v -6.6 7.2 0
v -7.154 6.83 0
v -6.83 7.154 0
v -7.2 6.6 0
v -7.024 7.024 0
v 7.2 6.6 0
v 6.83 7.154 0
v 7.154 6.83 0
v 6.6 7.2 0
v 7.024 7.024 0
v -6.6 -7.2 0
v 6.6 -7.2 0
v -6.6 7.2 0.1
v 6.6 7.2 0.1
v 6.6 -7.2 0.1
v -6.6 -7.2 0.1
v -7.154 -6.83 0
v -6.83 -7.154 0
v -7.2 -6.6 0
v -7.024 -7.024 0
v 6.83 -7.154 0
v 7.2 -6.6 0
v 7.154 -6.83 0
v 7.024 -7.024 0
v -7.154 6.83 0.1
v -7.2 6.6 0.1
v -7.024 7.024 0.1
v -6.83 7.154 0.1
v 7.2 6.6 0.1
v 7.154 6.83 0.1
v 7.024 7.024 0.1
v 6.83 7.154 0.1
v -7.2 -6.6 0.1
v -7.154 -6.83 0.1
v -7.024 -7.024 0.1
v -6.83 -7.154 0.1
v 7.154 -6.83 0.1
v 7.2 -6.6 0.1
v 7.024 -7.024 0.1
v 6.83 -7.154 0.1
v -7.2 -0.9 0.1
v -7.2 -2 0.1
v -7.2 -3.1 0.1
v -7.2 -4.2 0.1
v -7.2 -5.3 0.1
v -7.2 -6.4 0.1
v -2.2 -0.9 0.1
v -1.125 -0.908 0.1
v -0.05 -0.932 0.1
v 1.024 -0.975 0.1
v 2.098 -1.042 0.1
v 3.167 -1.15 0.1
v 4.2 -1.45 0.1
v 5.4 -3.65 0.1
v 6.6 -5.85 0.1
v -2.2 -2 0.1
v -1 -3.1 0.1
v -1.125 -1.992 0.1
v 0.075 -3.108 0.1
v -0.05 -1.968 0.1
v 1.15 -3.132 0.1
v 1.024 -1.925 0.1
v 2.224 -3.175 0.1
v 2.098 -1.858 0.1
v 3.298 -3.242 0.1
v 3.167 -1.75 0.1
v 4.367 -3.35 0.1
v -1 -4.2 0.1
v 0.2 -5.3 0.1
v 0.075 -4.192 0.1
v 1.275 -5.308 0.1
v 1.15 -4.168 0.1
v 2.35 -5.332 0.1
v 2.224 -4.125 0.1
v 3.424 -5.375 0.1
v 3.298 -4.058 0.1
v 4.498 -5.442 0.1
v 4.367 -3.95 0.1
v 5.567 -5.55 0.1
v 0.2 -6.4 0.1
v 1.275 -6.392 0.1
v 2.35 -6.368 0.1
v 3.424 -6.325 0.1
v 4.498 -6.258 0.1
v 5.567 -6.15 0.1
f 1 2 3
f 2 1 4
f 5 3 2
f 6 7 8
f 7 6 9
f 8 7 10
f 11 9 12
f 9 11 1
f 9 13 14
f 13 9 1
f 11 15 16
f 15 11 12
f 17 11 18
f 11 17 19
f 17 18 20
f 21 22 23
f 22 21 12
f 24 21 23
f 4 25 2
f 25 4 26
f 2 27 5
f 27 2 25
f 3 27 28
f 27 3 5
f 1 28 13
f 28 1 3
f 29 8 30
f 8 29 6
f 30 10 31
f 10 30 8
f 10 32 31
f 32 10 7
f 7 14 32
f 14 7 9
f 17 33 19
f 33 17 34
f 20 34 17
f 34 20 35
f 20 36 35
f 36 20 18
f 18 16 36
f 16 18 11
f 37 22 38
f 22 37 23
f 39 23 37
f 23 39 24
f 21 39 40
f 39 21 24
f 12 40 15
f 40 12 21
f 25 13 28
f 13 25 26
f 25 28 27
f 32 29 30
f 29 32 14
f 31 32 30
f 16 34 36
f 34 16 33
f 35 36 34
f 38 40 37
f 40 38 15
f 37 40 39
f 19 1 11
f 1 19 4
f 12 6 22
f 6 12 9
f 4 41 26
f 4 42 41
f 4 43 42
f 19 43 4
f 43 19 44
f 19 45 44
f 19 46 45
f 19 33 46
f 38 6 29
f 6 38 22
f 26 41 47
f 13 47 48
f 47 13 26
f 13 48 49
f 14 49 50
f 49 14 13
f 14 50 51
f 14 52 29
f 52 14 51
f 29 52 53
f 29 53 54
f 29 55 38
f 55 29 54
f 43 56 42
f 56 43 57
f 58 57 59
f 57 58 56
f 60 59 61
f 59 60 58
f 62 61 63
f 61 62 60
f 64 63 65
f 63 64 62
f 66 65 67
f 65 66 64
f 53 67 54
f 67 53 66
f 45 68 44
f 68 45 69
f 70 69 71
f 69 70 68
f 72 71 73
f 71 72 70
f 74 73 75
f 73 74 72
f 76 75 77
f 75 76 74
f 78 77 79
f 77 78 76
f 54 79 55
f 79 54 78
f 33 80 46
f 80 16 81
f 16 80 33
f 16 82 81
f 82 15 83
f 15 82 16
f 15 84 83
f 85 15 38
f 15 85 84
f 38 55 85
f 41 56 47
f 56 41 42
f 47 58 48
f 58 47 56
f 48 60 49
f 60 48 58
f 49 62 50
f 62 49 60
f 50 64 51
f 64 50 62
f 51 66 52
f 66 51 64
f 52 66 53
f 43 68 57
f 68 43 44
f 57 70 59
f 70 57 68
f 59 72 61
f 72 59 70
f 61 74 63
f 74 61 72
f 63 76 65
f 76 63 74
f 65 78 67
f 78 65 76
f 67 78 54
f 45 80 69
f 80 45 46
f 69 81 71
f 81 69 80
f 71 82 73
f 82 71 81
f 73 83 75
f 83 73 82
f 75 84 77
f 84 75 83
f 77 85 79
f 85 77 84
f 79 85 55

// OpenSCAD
// file: ../p/box3u12.scad
use <../lib.scad>
function ldraw_lib__box3u12() = [
// 0 Box with 3 Parallel Faces without Any Edges
// 0 Name: box3u12.dat
// 0 Author: J.C. Tchang [tchang]
// 0 !LDRAW_ORG Primitive UPDATE 2014-02
// 0 !LICENSE Licensed under CC BY 4.0 : see CAreadme.txt
// 
// 0 BFC CERTIFY CCW
  [0,"BFC","CERTIFY"],
  [0,"BFC","CCW"],
// 
// 0 !HISTORY 2014-12-23 [PTadmin] Official Update 2014-02
// 
// 
// 4 16 -1 1 1 1 1 1 1 1 -1 -1 1 -1
  [4,16,-1,1,1,1,1,1,1,1,-1,-1,1,-1],
// 4 16 -1 1 1 -1 0 1 1 0 1 1 1 1
  [4,16,-1,1,1,-1,0,1,1,0,1,1,1,1],
// 4 16 1 1 -1 1 0 -1 -1 0 -1 -1 1 -1
  [4,16,1,1,-1,1,0,-1,-1,0,-1,-1,1,-1],
];
module ldraw_lib__box3u12(step=0, col=false, unit=2/5, alt=false, line=0.2, solid=!$preview)
    makepoly(ldraw_lib__box3u12(), step=step, col=col, unit=unit, alt=alt, line=line, solid=solid);
ldraw_lib__box3u12(line=0.2);
// file: ../p/1-4cyli.scad
use <../lib.scad>
function ldraw_lib__1_4cyli() = [
// 0 Cylinder 0.25
// 0 Name: 1-4cyli.dat
// 0 Author: James Jessiman
// 0 !LDRAW_ORG Primitive UPDATE 2012-01
// 0 !LICENSE Licensed under CC BY 4.0 : see CAreadme.txt
// 
// 0 BFC CERTIFY CCW
  [0,"BFC","CERTIFY"],
  [0,"BFC","CCW"],
// 
// 0 !HISTORY 2002-03-23 [sbliss] Added BFC statement.
// 0 !HISTORY 2002-04-25 [PTadmin] Official Update 2002-02
// 0 !HISTORY 2007-06-22 [PTadmin] Header formatted for Contributor Agreement
// 0 !HISTORY 2008-07-01 [PTadmin] Official Update 2008-01
// 0 !HISTORY 2012-02-16 [Philo] Changed to CCW
// 0 !HISTORY 2012-03-30 [PTadmin] Official Update 2012-01
// 
// 
// 4 16 1 1 0 0.9239 1 0.3827 0.9239 0 0.3827 1 0 0
  [4,16,1,1,0,0.9239,1,0.3827,0.9239,0,0.3827,1,0,0],
// 5 24 1 0 0 1 1 0 0.9239 0 0.3827 1 0 -1
  [5,24,1,0,0,1,1,0,0.9239,0,0.3827,1,0,-1],
// 4 16 0.9239 1 0.3827 0.7071 1 0.7071 0.7071 0 0.7071 0.9239 0 0.3827
  [4,16,0.9239,1,0.3827,0.7071,1,0.7071,0.7071,0,0.7071,0.9239,0,0.3827],
// 5 24 0.9239 0 0.3827 0.9239 1 0.3827 0.7071 0 0.7071 1 0 0
  [5,24,0.9239,0,0.3827,0.9239,1,0.3827,0.7071,0,0.7071,1,0,0],
// 4 16 0.7071 1 0.7071 0.3827 1 0.9239 0.3827 0 0.9239 0.7071 0 0.7071
  [4,16,0.7071,1,0.7071,0.3827,1,0.9239,0.3827,0,0.9239,0.7071,0,0.7071],
// 5 24 0.7071 0 0.7071 0.7071 1 0.7071 0.3827 0 0.9239 0.9239 0 0.3827
  [5,24,0.7071,0,0.7071,0.7071,1,0.7071,0.3827,0,0.9239,0.9239,0,0.3827],
// 4 16 0.3827 1 0.9239 0 1 1 0 0 1 0.3827 0 0.9239
  [4,16,0.3827,1,0.9239,0,1,1,0,0,1,0.3827,0,0.9239],
// 5 24 0.3827 0 0.9239 0.3827 1 0.9239 0 0 1 0.7071 0 0.7071
  [5,24,0.3827,0,0.9239,0.3827,1,0.9239,0,0,1,0.7071,0,0.7071],
// 5 24 0 0 1 0 1 1 0.3827 0 0.9239 -1 0 1
  [5,24,0,0,1,0,1,1,0.3827,0,0.9239,-1,0,1],
];
module ldraw_lib__1_4cyli(step=0, col=false, unit=2/5, alt=false, line=0.2, solid=!$preview)
    makepoly(ldraw_lib__1_4cyli(), step=step, col=col, unit=unit, alt=alt, line=line, solid=solid);
ldraw_lib__1_4cyli(line=0.2);
// file: ../p/1-4chrd.scad
use <../lib.scad>
function ldraw_lib__1_4chrd() = [
// 0 Chord 0.25
// 0 Name: 1-4chrd.dat
// 0 Author: Max Martin Richter [MMR1988]
// 0 !LDRAW_ORG Primitive UPDATE 2023-05
// 0 !LICENSE Licensed under CC BY 4.0 : see CAreadme.txt
// 
// 0 BFC CERTIFY CCW
  [0,"BFC","CERTIFY"],
  [0,"BFC","CCW"],
// 
// 0 !HISTORY 2004-04-22 [PTadmin] Official Update 2004-02
// 0 !HISTORY 2007-10-09 [PTadmin] Header formatted for Contributor Agreement
// 0 !HISTORY 2008-07-01 [PTadmin] Official Update 2008-01
// 0 !HISTORY 2012-08-02 [MMR1988] Re-creation with PrimGen2 and Rectifier
// 0 !HISTORY 2012-08-09 [PTadmin] Official Update 2012-02
// 0 !HISTORY 2023-10-27 [OrionP] Change author to MMR1988 from hafhead
// 0 !HISTORY 2023-10-31 [OrionP] Official Update 2023-05
// 
// 4 16 0.9239 0 0.3827 0.3827 0 0.9239 0 0 1 1 0 0
  [4,16,0.9239,0,0.3827,0.3827,0,0.9239,0,0,1,1,0,0],
// 3 16 0.7071 0 0.7071 0.3827 0 0.9239 0.9239 0 0.3827
  [3,16,0.7071,0,0.7071,0.3827,0,0.9239,0.9239,0,0.3827],
];
module ldraw_lib__1_4chrd(step=0, col=false, unit=2/5, alt=false, line=0.2, solid=!$preview)
    makepoly(ldraw_lib__1_4chrd(), step=step, col=col, unit=unit, alt=alt, line=line, solid=solid);
ldraw_lib__1_4chrd(line=0.2);
// main file
use <../lib.scad>
use <../p/1-4chrd.scad>
use <../p/1-4cyli.scad>
use <../p/box3u12.scad>
function ldraw_lib__6148328t() = [
// 0 Sticker  1.8 x  1.8 with White Stripes on Red Background
// 0 Name: 6148328t.dat
// 0 Author: Massimo Maso [Sirio]
// 0 !LDRAW_ORG Part UPDATE 2024-01
// 0 !LICENSE Licensed under CC BY 4.0 : see CAreadme.txt
// 
// 0 BFC CERTIFY CCW
  [0,"BFC","CERTIFY"],
  [0,"BFC","CCW"],
// 
// 0 !KEYWORDS 917K, Bricklink 75876stk01, Brickowl 852010, Pit Lane, Porsche
// 0 !KEYWORDS Rebrickable 26357, set 75876, Speed Champions
// 
// 0 !HISTORY 2024-01-29 [OrionP] Official Update 2024-01
// 
// 
// 0 // Primitives
// 
// 1 16 -16.5 0 16.5 -1.5 0 0 0 -1 0 0 0 1.5 1-4chrd.dat
  [1,16,-16.5,0,16.5,-1.5,0,0,0,-1,0,0,0,1.5, ldraw_lib__1_4chrd()],
// 1 16 16.5 0 16.5 1.5 0 0 0 -1 0 0 0 1.5 1-4chrd.dat
  [1,16,16.5,0,16.5,1.5,0,0,0,-1,0,0,0,1.5, ldraw_lib__1_4chrd()],
// 1 16 0 -.25 0 16.5 0 0 0 .25 0 0 0 18 box3u12.dat
  [1,16,0,-.25,0,16.5,0,0,0,.25,0,0,0,18, ldraw_lib__box3u12()],
// 1 16 -16.5 0 -16.5 -1.5 0 0 0 -1 0 0 0 -1.5 1-4chrd.dat
  [1,16,-16.5,0,-16.5,-1.5,0,0,0,-1,0,0,0,-1.5, ldraw_lib__1_4chrd()],
// 1 16 16.5 0 -16.5 1.5 0 0 0 -1 0 0 0 -1.5 1-4chrd.dat
  [1,16,16.5,0,-16.5,1.5,0,0,0,-1,0,0,0,-1.5, ldraw_lib__1_4chrd()],
// 1 16 -16.5 0 16.5 -1.5 0 0 0 -.25 0 0 0 1.5 1-4cyli.dat
  [1,16,-16.5,0,16.5,-1.5,0,0,0,-.25,0,0,0,1.5, ldraw_lib__1_4cyli()],
// 1 16 16.5 0 16.5 1.5 0 0 0 -.25 0 0 0 1.5 1-4cyli.dat
  [1,16,16.5,0,16.5,1.5,0,0,0,-.25,0,0,0,1.5, ldraw_lib__1_4cyli()],
// 1 16 -16.5 0 -16.5 -1.5 0 0 0 -.25 0 0 0 -1.5 1-4cyli.dat
  [1,16,-16.5,0,-16.5,-1.5,0,0,0,-.25,0,0,0,-1.5, ldraw_lib__1_4cyli()],
// 1 16 16.5 0 -16.5 1.5 0 0 0 -.25 0 0 0 -1.5 1-4cyli.dat
  [1,16,16.5,0,-16.5,1.5,0,0,0,-.25,0,0,0,-1.5, ldraw_lib__1_4cyli()],
// 1 4 -16.5 -.25 16.5 -1.5 0 0 0 1 0 0 0 1.5 1-4chrd.dat
  [1,4,-16.5,-.25,16.5,-1.5,0,0,0,1,0,0,0,1.5, ldraw_lib__1_4chrd()],
// 1 4 16.5 -.25 16.5 1.5 0 0 0 1 0 0 0 1.5 1-4chrd.dat
  [1,4,16.5,-.25,16.5,1.5,0,0,0,1,0,0,0,1.5, ldraw_lib__1_4chrd()],
// 1 4 -16.5 -.25 -16.5 -1.5 0 0 0 1 0 0 0 -1.5 1-4chrd.dat
  [1,4,-16.5,-.25,-16.5,-1.5,0,0,0,1,0,0,0,-1.5, ldraw_lib__1_4chrd()],
// 1 4 16.5 -.25 -16.5 1.5 0 0 0 1 0 0 0 -1.5 1-4chrd.dat
  [1,4,16.5,-.25,-16.5,1.5,0,0,0,1,0,0,0,-1.5, ldraw_lib__1_4chrd()],
// 0 // Bottom faces
// 4 16 -16.5 0 18 -16.5 0 -18 -18 0 -16.5 -18 0 16.5
  [4,16,-16.5,0,18,-16.5,0,-18,-18,0,-16.5,-18,0,16.5],
// 4 16 16.5 0 18 18 0 16.5 18 0 -16.5 16.5 0 -18
  [4,16,16.5,0,18,18,0,16.5,18,0,-16.5,16.5,0,-18],
// 0 // Lateral faces
// 3 16 -18 0 16.5 -18 -.25 -2.25 -18 -.25 16.5
  [3,16,-18,0,16.5,-18,-.25,-2.25,-18,-.25,16.5],
// 3 16 -18 0 16.5 -18 -.25 -5 -18 -.25 -2.25
  [3,16,-18,0,16.5,-18,-.25,-5,-18,-.25,-2.25],
// 3 16 -18 0 16.5 -18 -.25 -7.75 -18 -.25 -5
  [3,16,-18,0,16.5,-18,-.25,-7.75,-18,-.25,-5],
// 4 16 -18 0 16.5 -18 0 -16.5 -18 -.25 -10.5 -18 -.25 -7.75
  [4,16,-18,0,16.5,-18,0,-16.5,-18,-.25,-10.5,-18,-.25,-7.75],
// 3 16 -18 0 -16.5 -18 -.25 -13.25 -18 -.25 -10.5
  [3,16,-18,0,-16.5,-18,-.25,-13.25,-18,-.25,-10.5],
// 3 16 -18 0 -16.5 -18 -.25 -16 -18 -.25 -13.25
  [3,16,-18,0,-16.5,-18,-.25,-16,-18,-.25,-13.25],
// 3 16 -18 0 -16.5 -18 -.25 -16.5 -18 -.25 -16
  [3,16,-18,0,-16.5,-18,-.25,-16.5,-18,-.25,-16],
// 4 16 18 0 16.5 18 -.25 16.5 18 -.25 -16.5 18 0 -16.5
  [4,16,18,0,16.5,18,-.25,16.5,18,-.25,-16.5,18,0,-16.5],
// 0 // Top faces
// 0 // Red faces
// 3 4 -18 -.25 16.5 -18 -.25 -2.25 -5.5 -.25 -2.25
  [3,4,-18,-.25,16.5,-18,-.25,-2.25,-5.5,-.25,-2.25],
// 4 4 -18 -.25 16.5 -5.5 -.25 -2.25 -2.812 -.25 -2.2695 -16.5 -.25 18
  [4,4,-18,-.25,16.5,-5.5,-.25,-2.25,-2.812,-.25,-2.2695,-16.5,-.25,18],
// 3 4 -16.5 -.25 18 -2.812 -.25 -2.2695 -.1247 -.25 -2.3299
  [3,4,-16.5,-.25,18,-2.812,-.25,-2.2695,-.1247,-.25,-2.3299],
// 4 4 -16.5 -.25 18 -.1247 -.25 -2.3299 2.5612 -.25 -2.4373 16.5 -.25 18
  [4,4,-16.5,-.25,18,-.1247,-.25,-2.3299,2.5612,-.25,-2.4373,16.5,-.25,18],
// 3 4 16.5 -.25 18 2.5612 -.25 -2.4373 5.244 -.25 -2.6061
  [3,4,16.5,-.25,18,2.5612,-.25,-2.4373,5.244,-.25,-2.6061],
// 4 4 16.5 -.25 18 5.244 -.25 -2.6061 7.9184 -.25 -2.8761 18 -.25 16.5
  [4,4,16.5,-.25,18,5.244,-.25,-2.6061,7.9184,-.25,-2.8761,18,-.25,16.5],
// 3 4 18 -.25 16.5 7.9184 -.25 -2.8761 10.5 -.25 -3.625
  [3,4,18,-.25,16.5,7.9184,-.25,-2.8761,10.5,-.25,-3.625],
// 3 4 18 -.25 16.5 10.5 -.25 -3.625 13.5 -.25 -9.125
  [3,4,18,-.25,16.5,10.5,-.25,-3.625,13.5,-.25,-9.125],
// 4 4 18 -.25 16.5 13.5 -.25 -9.125 16.5 -.25 -14.625 18 -.25 -16.5
  [4,4,18,-.25,16.5,13.5,-.25,-9.125,16.5,-.25,-14.625,18,-.25,-16.5],
// 4 4 -18 -.25 -5 -18 -.25 -7.75 -2.5 -.25 -7.75 -5.5 -.25 -5
  [4,4,-18,-.25,-5,-18,-.25,-7.75,-2.5,-.25,-7.75,-5.5,-.25,-5],
// 4 4 -5.5 -.25 -5 -2.5 -.25 -7.75 .188 -.25 -7.7695 -2.812 -.25 -4.9805
  [4,4,-5.5,-.25,-5,-2.5,-.25,-7.75,.188,-.25,-7.7695,-2.812,-.25,-4.9805],
// 4 4 -2.812 -.25 -4.9805 .188 -.25 -7.7695 2.8753 -.25 -7.8299 -.1247 -.25 -4.9201
  [4,4,-2.812,-.25,-4.9805,.188,-.25,-7.7695,2.8753,-.25,-7.8299,-.1247,-.25,-4.9201],
// 4 4 -.1247 -.25 -4.9201 2.8753 -.25 -7.8299 5.5612 -.25 -7.9373 2.5612 -.25 -4.8127
  [4,4,-.1247,-.25,-4.9201,2.8753,-.25,-7.8299,5.5612,-.25,-7.9373,2.5612,-.25,-4.8127],
// 4 4 2.5612 -.25 -4.8127 5.5612 -.25 -7.9373 8.244 -.25 -8.1061 5.244 -.25 -4.6439
  [4,4,2.5612,-.25,-4.8127,5.5612,-.25,-7.9373,8.244,-.25,-8.1061,5.244,-.25,-4.6439],
// 4 4 5.244 -.25 -4.6439 8.244 -.25 -8.1061 10.9184 -.25 -8.3761 7.9184 -.25 -4.3739
  [4,4,5.244,-.25,-4.6439,8.244,-.25,-8.1061,10.9184,-.25,-8.3761,7.9184,-.25,-4.3739],
// 4 4 7.9184 -.25 -4.3739 10.9184 -.25 -8.3761 13.5 -.25 -9.125 10.5 -.25 -3.625
  [4,4,7.9184,-.25,-4.3739,10.9184,-.25,-8.3761,13.5,-.25,-9.125,10.5,-.25,-3.625],
// 4 4 -18 -.25 -10.5 -18 -.25 -13.25 .5 -.25 -13.25 -2.5 -.25 -10.5
  [4,4,-18,-.25,-10.5,-18,-.25,-13.25,.5,-.25,-13.25,-2.5,-.25,-10.5],
// 4 4 -2.5 -.25 -10.5 .5 -.25 -13.25 3.188 -.25 -13.2695 .188 -.25 -10.4805
  [4,4,-2.5,-.25,-10.5,.5,-.25,-13.25,3.188,-.25,-13.2695,.188,-.25,-10.4805],
// 4 4 .188 -.25 -10.4805 3.188 -.25 -13.2695 5.8753 -.25 -13.3299 2.8753 -.25 -10.4201
  [4,4,.188,-.25,-10.4805,3.188,-.25,-13.2695,5.8753,-.25,-13.3299,2.8753,-.25,-10.4201],
// 4 4 2.8753 -.25 -10.4201 5.8753 -.25 -13.3299 8.5612 -.25 -13.4373 5.5612 -.25 -10.3127
  [4,4,2.8753,-.25,-10.4201,5.8753,-.25,-13.3299,8.5612,-.25,-13.4373,5.5612,-.25,-10.3127],
// 4 4 5.5612 -.25 -10.3127 8.5612 -.25 -13.4373 11.244 -.25 -13.6061 8.244 -.25 -10.1439
  [4,4,5.5612,-.25,-10.3127,8.5612,-.25,-13.4373,11.244,-.25,-13.6061,8.244,-.25,-10.1439],
// 4 4 8.244 -.25 -10.1439 11.244 -.25 -13.6061 13.9184 -.25 -13.8761 10.9184 -.25 -9.8739
  [4,4,8.244,-.25,-10.1439,11.244,-.25,-13.6061,13.9184,-.25,-13.8761,10.9184,-.25,-9.8739],
// 4 4 10.9184 -.25 -9.8739 13.9184 -.25 -13.8761 16.5 -.25 -14.625 13.5 -.25 -9.125
  [4,4,10.9184,-.25,-9.8739,13.9184,-.25,-13.8761,16.5,-.25,-14.625,13.5,-.25,-9.125],
// 3 4 -18 -.25 -16.5 .5 -.25 -16 -18 -.25 -16
  [3,4,-18,-.25,-16.5,.5,-.25,-16,-18,-.25,-16],
// 4 4 -18 -.25 -16.5 -16.5 -.25 -18 3.188 -.25 -15.9805 .5 -.25 -16
  [4,4,-18,-.25,-16.5,-16.5,-.25,-18,3.188,-.25,-15.9805,.5,-.25,-16],
// 3 4 -16.5 -.25 -18 5.8753 -.25 -15.9201 3.188 -.25 -15.9805
  [3,4,-16.5,-.25,-18,5.8753,-.25,-15.9201,3.188,-.25,-15.9805],
// 4 4 -16.5 -.25 -18 16.5 -.25 -18 8.5612 -.25 -15.8127 5.8753 -.25 -15.9201
  [4,4,-16.5,-.25,-18,16.5,-.25,-18,8.5612,-.25,-15.8127,5.8753,-.25,-15.9201],
// 3 4 16.5 -.25 -18 11.244 -.25 -15.6439 8.5612 -.25 -15.8127
  [3,4,16.5,-.25,-18,11.244,-.25,-15.6439,8.5612,-.25,-15.8127],
// 4 4 16.5 -.25 -18 18 -.25 -16.5 13.9184 -.25 -15.3739 11.244 -.25 -15.6439
  [4,4,16.5,-.25,-18,18,-.25,-16.5,13.9184,-.25,-15.3739,11.244,-.25,-15.6439],
// 3 4 18 -.25 -16.5 16.5 -.25 -14.625 13.9184 -.25 -15.3739
  [3,4,18,-.25,-16.5,16.5,-.25,-14.625,13.9184,-.25,-15.3739],
// 0 // White faces
// 4 15 -18 -.25 -2.25 -18 -.25 -5 -5.5 -.25 -5 -5.5 -.25 -2.25
  [4,15,-18,-.25,-2.25,-18,-.25,-5,-5.5,-.25,-5,-5.5,-.25,-2.25],
// 4 15 -5.5 -.25 -2.25 -5.5 -.25 -5 -2.812 -.25 -4.9805 -2.812 -.25 -2.2695
  [4,15,-5.5,-.25,-2.25,-5.5,-.25,-5,-2.812,-.25,-4.9805,-2.812,-.25,-2.2695],
// 4 15 -2.812 -.25 -2.2695 -2.812 -.25 -4.9805 -.1247 -.25 -4.9201 -.1247 -.25 -2.3299
  [4,15,-2.812,-.25,-2.2695,-2.812,-.25,-4.9805,-.1247,-.25,-4.9201,-.1247,-.25,-2.3299],
// 4 15 -.1247 -.25 -2.3299 -.1247 -.25 -4.9201 2.5612 -.25 -4.8127 2.5612 -.25 -2.4373
  [4,15,-.1247,-.25,-2.3299,-.1247,-.25,-4.9201,2.5612,-.25,-4.8127,2.5612,-.25,-2.4373],
// 4 15 2.5612 -.25 -2.4373 2.5612 -.25 -4.8127 5.244 -.25 -4.6439 5.244 -.25 -2.6061
  [4,15,2.5612,-.25,-2.4373,2.5612,-.25,-4.8127,5.244,-.25,-4.6439,5.244,-.25,-2.6061],
// 4 15 5.244 -.25 -2.6061 5.244 -.25 -4.6439 7.9184 -.25 -4.3739 7.9184 -.25 -2.8761
  [4,15,5.244,-.25,-2.6061,5.244,-.25,-4.6439,7.9184,-.25,-4.3739,7.9184,-.25,-2.8761],
// 3 15 7.9184 -.25 -2.8761 7.9184 -.25 -4.3739 10.5 -.25 -3.625
  [3,15,7.9184,-.25,-2.8761,7.9184,-.25,-4.3739,10.5,-.25,-3.625],
// 4 15 -18 -.25 -7.75 -18 -.25 -10.5 -2.5 -.25 -10.5 -2.5 -.25 -7.75
  [4,15,-18,-.25,-7.75,-18,-.25,-10.5,-2.5,-.25,-10.5,-2.5,-.25,-7.75],
// 4 15 -2.5 -.25 -7.75 -2.5 -.25 -10.5 .188 -.25 -10.4805 .188 -.25 -7.7695
  [4,15,-2.5,-.25,-7.75,-2.5,-.25,-10.5,.188,-.25,-10.4805,.188,-.25,-7.7695],
// 4 15 .188 -.25 -7.7695 .188 -.25 -10.4805 2.8753 -.25 -10.4201 2.8753 -.25 -7.8299
  [4,15,.188,-.25,-7.7695,.188,-.25,-10.4805,2.8753,-.25,-10.4201,2.8753,-.25,-7.8299],
// 4 15 2.8753 -.25 -7.8299 2.8753 -.25 -10.4201 5.5612 -.25 -10.3127 5.5612 -.25 -7.9373
  [4,15,2.8753,-.25,-7.8299,2.8753,-.25,-10.4201,5.5612,-.25,-10.3127,5.5612,-.25,-7.9373],
// 4 15 5.5612 -.25 -7.9373 5.5612 -.25 -10.3127 8.244 -.25 -10.1439 8.244 -.25 -8.1061
  [4,15,5.5612,-.25,-7.9373,5.5612,-.25,-10.3127,8.244,-.25,-10.1439,8.244,-.25,-8.1061],
// 4 15 8.244 -.25 -8.1061 8.244 -.25 -10.1439 10.9184 -.25 -9.8739 10.9184 -.25 -8.3761
  [4,15,8.244,-.25,-8.1061,8.244,-.25,-10.1439,10.9184,-.25,-9.8739,10.9184,-.25,-8.3761],
// 3 15 10.9184 -.25 -8.3761 10.9184 -.25 -9.8739 13.5 -.25 -9.125
  [3,15,10.9184,-.25,-8.3761,10.9184,-.25,-9.8739,13.5,-.25,-9.125],
// 4 15 -18 -.25 -13.25 -18 -.25 -16 .5 -.25 -16 .5 -.25 -13.25
  [4,15,-18,-.25,-13.25,-18,-.25,-16,.5,-.25,-16,.5,-.25,-13.25],
// 4 15 .5 -.25 -13.25 .5 -.25 -16 3.188 -.25 -15.9805 3.188 -.25 -13.2695
  [4,15,.5,-.25,-13.25,.5,-.25,-16,3.188,-.25,-15.9805,3.188,-.25,-13.2695],
// 4 15 3.188 -.25 -13.2695 3.188 -.25 -15.9805 5.8753 -.25 -15.9201 5.8753 -.25 -13.3299
  [4,15,3.188,-.25,-13.2695,3.188,-.25,-15.9805,5.8753,-.25,-15.9201,5.8753,-.25,-13.3299],
// 4 15 5.8753 -.25 -13.3299 5.8753 -.25 -15.9201 8.5612 -.25 -15.8127 8.5612 -.25 -13.4373
  [4,15,5.8753,-.25,-13.3299,5.8753,-.25,-15.9201,8.5612,-.25,-15.8127,8.5612,-.25,-13.4373],
// 4 15 8.5612 -.25 -13.4373 8.5612 -.25 -15.8127 11.244 -.25 -15.6439 11.244 -.25 -13.6061
  [4,15,8.5612,-.25,-13.4373,8.5612,-.25,-15.8127,11.244,-.25,-15.6439,11.244,-.25,-13.6061],
// 4 15 11.244 -.25 -13.6061 11.244 -.25 -15.6439 13.9184 -.25 -15.3739 13.9184 -.25 -13.8761
  [4,15,11.244,-.25,-13.6061,11.244,-.25,-15.6439,13.9184,-.25,-15.3739,13.9184,-.25,-13.8761],
// 3 15 13.9184 -.25 -13.8761 13.9184 -.25 -15.3739 16.5 -.25 -14.625
  [3,15,13.9184,-.25,-13.8761,13.9184,-.25,-15.3739,16.5,-.25,-14.625],
];
module ldraw_lib__6148328t(step=0, col=false, unit=2/5, alt=false, line=0.2, solid=!$preview)
    makepoly(ldraw_lib__6148328t(), step=step, col=col, unit=unit, alt=alt, line=line, solid=solid);
ldraw_lib__6148328t(line=0.2);
